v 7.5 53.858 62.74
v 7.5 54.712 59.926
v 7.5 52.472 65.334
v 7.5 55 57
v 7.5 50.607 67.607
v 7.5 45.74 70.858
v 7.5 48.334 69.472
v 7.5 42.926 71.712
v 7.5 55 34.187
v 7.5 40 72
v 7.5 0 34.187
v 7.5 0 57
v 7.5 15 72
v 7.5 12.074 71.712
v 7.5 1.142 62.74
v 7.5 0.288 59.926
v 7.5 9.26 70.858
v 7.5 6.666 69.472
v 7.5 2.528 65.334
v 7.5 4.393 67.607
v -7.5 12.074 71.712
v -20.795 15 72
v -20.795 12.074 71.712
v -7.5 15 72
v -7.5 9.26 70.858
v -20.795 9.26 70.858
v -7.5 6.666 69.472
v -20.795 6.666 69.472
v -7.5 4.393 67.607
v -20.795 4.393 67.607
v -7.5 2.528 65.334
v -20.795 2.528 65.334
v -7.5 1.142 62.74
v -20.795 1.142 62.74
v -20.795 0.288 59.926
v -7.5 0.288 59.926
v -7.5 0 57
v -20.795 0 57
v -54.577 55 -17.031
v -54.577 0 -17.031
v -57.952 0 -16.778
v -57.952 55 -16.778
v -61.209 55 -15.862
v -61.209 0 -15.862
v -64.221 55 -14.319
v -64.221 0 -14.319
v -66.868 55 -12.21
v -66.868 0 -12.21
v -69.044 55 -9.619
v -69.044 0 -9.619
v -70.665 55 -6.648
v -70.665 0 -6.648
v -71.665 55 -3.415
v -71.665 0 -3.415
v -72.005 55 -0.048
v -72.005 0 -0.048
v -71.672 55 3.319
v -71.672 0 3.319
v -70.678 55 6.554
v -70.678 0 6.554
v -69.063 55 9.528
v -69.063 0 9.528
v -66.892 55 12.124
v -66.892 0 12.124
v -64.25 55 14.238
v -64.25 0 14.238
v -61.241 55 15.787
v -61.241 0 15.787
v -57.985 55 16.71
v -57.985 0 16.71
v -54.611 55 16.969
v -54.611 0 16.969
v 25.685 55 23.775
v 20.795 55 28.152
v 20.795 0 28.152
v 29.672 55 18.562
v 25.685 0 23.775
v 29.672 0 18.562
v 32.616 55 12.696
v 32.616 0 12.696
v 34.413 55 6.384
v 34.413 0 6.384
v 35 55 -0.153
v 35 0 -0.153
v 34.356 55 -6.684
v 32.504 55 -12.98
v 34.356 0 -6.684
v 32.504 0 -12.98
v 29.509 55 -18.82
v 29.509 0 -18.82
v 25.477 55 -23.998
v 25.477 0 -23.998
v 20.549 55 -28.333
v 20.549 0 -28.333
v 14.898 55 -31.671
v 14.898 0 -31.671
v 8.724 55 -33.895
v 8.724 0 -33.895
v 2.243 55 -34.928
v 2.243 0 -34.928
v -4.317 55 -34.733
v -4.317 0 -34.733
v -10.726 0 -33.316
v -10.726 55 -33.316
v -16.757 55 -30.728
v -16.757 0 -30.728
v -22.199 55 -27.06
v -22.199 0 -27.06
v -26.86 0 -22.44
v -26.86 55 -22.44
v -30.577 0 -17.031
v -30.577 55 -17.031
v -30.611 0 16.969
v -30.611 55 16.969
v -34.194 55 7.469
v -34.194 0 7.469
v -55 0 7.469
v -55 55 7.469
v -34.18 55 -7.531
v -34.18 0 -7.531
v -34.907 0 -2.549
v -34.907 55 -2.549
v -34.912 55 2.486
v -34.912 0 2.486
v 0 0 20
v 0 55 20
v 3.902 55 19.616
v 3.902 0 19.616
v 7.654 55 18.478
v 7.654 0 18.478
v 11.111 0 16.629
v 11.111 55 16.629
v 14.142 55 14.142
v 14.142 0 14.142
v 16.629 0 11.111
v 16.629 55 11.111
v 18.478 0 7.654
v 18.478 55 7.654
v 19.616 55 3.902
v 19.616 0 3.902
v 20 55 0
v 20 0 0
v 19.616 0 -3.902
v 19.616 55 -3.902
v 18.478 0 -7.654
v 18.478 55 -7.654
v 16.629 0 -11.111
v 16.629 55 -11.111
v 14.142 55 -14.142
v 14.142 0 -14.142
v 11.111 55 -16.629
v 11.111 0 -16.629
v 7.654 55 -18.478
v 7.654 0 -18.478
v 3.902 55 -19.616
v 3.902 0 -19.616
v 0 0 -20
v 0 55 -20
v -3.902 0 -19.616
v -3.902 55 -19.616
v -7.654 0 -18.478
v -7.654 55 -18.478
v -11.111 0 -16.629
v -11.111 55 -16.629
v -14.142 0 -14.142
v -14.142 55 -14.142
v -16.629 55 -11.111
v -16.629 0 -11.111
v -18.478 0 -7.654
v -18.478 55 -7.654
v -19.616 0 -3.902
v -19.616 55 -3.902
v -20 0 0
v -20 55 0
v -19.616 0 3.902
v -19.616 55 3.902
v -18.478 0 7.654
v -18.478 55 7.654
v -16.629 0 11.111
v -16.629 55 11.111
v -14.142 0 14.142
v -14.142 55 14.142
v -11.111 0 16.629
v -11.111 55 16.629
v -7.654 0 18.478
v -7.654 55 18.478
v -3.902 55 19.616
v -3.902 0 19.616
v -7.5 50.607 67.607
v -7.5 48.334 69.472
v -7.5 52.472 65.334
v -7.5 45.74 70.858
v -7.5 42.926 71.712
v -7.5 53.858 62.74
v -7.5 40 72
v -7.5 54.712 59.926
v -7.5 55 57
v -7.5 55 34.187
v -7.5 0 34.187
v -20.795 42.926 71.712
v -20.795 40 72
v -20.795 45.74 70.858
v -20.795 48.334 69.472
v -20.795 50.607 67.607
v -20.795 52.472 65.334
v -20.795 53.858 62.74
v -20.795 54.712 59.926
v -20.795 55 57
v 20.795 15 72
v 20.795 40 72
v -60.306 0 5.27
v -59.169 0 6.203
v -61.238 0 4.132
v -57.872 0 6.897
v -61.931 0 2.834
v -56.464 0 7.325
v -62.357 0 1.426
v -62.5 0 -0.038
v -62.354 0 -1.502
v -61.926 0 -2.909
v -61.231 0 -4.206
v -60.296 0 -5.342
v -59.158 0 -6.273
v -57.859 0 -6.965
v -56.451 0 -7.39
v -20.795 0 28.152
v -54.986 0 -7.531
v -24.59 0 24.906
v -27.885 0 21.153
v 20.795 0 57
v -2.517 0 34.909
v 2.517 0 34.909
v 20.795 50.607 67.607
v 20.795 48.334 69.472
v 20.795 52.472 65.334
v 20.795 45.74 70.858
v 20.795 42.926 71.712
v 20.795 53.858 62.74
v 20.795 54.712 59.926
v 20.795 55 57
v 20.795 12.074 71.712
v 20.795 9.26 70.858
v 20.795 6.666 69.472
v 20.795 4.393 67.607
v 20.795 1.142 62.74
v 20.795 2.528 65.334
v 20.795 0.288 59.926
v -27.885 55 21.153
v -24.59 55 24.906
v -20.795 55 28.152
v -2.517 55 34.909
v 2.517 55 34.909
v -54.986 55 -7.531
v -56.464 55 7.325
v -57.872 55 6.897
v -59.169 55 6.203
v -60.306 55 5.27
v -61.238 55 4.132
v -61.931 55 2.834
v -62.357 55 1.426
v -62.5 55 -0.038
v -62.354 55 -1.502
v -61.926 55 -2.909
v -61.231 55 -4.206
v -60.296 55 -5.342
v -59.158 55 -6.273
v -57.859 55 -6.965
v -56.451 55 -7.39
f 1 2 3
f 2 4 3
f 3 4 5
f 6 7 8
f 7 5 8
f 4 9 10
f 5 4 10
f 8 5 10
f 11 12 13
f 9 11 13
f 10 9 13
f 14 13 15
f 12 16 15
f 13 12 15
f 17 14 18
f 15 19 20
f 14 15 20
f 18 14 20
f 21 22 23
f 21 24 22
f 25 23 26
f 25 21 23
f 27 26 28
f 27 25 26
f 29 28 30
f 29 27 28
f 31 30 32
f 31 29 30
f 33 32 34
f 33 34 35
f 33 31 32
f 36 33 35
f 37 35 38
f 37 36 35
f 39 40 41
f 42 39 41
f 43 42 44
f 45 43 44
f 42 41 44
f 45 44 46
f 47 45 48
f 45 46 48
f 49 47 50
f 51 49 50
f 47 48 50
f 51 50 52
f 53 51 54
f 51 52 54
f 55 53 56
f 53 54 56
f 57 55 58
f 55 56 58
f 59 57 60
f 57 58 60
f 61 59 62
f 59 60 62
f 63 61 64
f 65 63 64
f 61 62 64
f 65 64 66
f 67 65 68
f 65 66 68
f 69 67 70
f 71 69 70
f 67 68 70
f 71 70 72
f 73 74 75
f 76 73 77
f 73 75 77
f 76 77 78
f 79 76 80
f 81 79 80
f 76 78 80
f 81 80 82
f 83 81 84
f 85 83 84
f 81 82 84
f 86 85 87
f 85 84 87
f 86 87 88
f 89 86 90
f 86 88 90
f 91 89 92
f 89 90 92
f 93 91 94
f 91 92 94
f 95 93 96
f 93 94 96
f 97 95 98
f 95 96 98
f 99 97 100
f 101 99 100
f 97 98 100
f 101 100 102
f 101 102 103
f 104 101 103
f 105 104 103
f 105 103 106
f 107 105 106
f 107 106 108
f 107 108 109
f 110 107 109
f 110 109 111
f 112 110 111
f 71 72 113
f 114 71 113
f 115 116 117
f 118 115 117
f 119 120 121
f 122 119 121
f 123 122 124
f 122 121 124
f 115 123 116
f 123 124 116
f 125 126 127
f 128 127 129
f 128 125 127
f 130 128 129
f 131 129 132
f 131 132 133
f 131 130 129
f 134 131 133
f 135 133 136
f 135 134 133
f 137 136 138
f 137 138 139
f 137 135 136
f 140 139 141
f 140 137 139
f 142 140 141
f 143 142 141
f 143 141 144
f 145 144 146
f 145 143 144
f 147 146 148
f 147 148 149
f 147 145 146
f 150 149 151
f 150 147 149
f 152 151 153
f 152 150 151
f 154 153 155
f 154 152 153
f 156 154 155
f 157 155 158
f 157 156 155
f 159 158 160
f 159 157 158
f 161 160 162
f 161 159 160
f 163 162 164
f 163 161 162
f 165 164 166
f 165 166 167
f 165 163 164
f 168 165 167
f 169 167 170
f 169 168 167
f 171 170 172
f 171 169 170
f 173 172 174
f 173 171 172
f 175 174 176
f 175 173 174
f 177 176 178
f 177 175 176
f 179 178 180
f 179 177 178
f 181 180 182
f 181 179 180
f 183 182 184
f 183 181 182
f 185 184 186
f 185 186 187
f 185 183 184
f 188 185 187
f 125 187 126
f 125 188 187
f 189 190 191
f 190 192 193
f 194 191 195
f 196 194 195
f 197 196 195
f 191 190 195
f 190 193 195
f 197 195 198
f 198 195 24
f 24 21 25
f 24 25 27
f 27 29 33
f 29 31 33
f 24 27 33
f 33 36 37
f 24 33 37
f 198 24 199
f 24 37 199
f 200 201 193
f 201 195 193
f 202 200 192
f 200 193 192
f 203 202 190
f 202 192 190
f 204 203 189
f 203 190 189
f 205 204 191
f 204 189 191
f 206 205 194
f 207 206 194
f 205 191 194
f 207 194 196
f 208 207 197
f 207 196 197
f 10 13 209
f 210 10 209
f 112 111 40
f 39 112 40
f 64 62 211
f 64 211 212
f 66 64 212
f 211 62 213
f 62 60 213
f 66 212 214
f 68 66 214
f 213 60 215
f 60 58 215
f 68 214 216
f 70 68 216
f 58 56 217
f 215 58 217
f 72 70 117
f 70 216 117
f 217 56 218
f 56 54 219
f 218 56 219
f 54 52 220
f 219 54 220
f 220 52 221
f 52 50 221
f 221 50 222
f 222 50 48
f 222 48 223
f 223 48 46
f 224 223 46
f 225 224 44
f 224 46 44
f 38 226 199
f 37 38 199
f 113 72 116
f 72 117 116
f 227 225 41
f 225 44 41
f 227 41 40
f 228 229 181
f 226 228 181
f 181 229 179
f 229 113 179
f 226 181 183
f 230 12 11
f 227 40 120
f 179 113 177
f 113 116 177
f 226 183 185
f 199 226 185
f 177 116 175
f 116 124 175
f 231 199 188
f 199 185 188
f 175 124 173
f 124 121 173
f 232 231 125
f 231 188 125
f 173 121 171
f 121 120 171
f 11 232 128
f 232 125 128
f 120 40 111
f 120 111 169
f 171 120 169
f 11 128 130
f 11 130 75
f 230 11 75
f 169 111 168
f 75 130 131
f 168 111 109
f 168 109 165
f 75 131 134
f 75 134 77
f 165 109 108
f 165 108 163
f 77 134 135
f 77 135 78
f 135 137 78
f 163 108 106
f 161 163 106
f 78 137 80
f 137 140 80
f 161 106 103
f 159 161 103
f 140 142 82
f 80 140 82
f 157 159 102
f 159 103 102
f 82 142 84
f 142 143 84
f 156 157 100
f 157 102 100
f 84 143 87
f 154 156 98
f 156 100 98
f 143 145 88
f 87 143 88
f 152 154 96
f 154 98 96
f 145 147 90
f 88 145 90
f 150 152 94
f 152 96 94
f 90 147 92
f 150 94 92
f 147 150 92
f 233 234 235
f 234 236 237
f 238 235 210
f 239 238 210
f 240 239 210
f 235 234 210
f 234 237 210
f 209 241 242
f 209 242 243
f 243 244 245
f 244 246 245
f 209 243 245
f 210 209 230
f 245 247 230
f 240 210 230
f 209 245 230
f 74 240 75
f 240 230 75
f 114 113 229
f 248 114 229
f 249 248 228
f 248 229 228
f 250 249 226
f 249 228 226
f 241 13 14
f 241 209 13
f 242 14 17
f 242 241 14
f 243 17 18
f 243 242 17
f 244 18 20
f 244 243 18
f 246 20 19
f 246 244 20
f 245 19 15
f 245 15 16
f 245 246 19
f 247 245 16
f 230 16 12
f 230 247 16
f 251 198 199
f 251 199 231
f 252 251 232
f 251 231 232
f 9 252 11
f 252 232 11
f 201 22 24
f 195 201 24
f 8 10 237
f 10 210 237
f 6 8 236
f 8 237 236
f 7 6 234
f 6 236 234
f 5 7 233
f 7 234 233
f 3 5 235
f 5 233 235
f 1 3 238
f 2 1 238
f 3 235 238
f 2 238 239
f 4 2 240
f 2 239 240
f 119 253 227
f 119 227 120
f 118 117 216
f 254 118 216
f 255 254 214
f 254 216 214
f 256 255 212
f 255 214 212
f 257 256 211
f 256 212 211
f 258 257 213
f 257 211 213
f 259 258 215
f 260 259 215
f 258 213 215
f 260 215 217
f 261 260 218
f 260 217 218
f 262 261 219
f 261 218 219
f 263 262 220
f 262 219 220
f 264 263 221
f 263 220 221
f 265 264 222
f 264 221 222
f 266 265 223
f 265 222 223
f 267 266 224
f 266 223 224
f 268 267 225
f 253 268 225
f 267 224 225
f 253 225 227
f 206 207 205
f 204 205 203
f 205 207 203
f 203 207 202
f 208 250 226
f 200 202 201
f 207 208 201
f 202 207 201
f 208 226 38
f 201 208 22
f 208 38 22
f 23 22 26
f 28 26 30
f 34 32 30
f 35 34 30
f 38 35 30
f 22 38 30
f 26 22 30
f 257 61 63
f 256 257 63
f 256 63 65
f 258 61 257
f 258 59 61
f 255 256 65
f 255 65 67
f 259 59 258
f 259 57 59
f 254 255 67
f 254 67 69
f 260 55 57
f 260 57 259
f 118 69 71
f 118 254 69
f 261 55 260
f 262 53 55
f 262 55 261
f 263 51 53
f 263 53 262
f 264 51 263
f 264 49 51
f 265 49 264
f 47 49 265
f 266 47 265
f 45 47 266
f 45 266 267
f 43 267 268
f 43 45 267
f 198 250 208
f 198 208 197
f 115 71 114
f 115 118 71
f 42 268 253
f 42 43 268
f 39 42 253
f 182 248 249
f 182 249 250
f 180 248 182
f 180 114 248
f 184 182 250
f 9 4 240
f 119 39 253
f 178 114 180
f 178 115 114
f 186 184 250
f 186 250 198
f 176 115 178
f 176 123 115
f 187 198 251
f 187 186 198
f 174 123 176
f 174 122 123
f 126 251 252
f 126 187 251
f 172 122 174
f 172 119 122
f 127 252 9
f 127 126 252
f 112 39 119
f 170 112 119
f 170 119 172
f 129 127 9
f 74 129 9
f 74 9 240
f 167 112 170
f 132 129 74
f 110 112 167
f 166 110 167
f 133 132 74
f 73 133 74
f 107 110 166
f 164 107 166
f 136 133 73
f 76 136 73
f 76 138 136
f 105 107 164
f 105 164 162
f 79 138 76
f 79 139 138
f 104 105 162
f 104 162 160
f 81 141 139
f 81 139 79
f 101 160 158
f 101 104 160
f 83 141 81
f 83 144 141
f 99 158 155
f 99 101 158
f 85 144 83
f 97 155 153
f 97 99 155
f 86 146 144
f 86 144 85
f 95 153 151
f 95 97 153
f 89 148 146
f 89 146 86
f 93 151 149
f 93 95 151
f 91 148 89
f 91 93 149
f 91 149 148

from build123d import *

# Parameters (mm, degrees)
SKETCH2_R           = 20
BOSS_EXTRUDE3_DEPTH = 55
FILLET1_R           = 15


with BuildPart() as part:
    # Sketch2 → Boss-Extrude3 (new body)
    with BuildSketch(Plane(origin=(0, 0, 0), x_dir=(1, 0, 0), z_dir=(0, 1, 0))):
        with BuildLine():
            Line((-20.795375831, -28.152306194), (-20.795375831, -72))
            Line((-20.795375831, -72), (-7.5, -72))
            Line((-7.5, -72), (-7.5, -34.186985828))
            ThreePointArc((-7.5, -34.186985828), (0, -35), (7.5, -34.186985828))
            Line((7.5, -34.186985828), (7.5, -72))
            Line((7.5, -72), (20.795375831, -72))
            Line((20.795375831, -72), (20.795375831, -28.152306194))
            ThreePointArc((20.795375831, -28.152306194), (23.114885766, 26.281211083), (-30.576990341, 17.030785705))
            Line((-30.576990341, 17.030785705), (-54.576990341, 17.030785705))
            ThreePointArc((-54.576990341, 17.030785705), (-72.004836058, 0.048305486), (-54.611203279, -16.969214295))
            Line((-54.611203279, -16.969214295), (-30.611203279, -16.969214295))
            ThreePointArc((-30.611203279, -16.969214295), (-26.304457418, -23.088428269), (-20.795375831, -28.152306194))
        make_face()
        with BuildLine():
            ThreePointArc((-34.180128859, 7.531187899), (-34.999985436, 0.031929592), (-34.193812975, -7.468812101))
            Line((-34.193812975, -7.468812101), (-54.999991154, -7.468812101))
            ThreePointArc((-54.999991154, -7.468812101), (-62.499994275, 0.038036202), (-54.986307038, 7.531187899))
            Line((-54.986307038, 7.531187899), (-34.180128859, 7.531187899))
        make_face(mode=Mode.SUBTRACT)
        with Locations(Location((0, 0, 0), (0, 0, 270))):
            Circle(SKETCH2_R, mode=Mode.SUBTRACT)
    extrude(amount=BOSS_EXTRUDE3_DEPTH)

    # Fillet1
    fillet1_edges = [part.edges().sort_by_distance(p)[0] for p in [
        (-14.147687915, 0, 72),
        (14.147687915, 0, 72),
        (14.147687915, 55, 72),
        (-14.147687915, 55, 72),
    ]]
    fillet(fillet1_edges, radius=FILLET1_R)


solid = part.part
